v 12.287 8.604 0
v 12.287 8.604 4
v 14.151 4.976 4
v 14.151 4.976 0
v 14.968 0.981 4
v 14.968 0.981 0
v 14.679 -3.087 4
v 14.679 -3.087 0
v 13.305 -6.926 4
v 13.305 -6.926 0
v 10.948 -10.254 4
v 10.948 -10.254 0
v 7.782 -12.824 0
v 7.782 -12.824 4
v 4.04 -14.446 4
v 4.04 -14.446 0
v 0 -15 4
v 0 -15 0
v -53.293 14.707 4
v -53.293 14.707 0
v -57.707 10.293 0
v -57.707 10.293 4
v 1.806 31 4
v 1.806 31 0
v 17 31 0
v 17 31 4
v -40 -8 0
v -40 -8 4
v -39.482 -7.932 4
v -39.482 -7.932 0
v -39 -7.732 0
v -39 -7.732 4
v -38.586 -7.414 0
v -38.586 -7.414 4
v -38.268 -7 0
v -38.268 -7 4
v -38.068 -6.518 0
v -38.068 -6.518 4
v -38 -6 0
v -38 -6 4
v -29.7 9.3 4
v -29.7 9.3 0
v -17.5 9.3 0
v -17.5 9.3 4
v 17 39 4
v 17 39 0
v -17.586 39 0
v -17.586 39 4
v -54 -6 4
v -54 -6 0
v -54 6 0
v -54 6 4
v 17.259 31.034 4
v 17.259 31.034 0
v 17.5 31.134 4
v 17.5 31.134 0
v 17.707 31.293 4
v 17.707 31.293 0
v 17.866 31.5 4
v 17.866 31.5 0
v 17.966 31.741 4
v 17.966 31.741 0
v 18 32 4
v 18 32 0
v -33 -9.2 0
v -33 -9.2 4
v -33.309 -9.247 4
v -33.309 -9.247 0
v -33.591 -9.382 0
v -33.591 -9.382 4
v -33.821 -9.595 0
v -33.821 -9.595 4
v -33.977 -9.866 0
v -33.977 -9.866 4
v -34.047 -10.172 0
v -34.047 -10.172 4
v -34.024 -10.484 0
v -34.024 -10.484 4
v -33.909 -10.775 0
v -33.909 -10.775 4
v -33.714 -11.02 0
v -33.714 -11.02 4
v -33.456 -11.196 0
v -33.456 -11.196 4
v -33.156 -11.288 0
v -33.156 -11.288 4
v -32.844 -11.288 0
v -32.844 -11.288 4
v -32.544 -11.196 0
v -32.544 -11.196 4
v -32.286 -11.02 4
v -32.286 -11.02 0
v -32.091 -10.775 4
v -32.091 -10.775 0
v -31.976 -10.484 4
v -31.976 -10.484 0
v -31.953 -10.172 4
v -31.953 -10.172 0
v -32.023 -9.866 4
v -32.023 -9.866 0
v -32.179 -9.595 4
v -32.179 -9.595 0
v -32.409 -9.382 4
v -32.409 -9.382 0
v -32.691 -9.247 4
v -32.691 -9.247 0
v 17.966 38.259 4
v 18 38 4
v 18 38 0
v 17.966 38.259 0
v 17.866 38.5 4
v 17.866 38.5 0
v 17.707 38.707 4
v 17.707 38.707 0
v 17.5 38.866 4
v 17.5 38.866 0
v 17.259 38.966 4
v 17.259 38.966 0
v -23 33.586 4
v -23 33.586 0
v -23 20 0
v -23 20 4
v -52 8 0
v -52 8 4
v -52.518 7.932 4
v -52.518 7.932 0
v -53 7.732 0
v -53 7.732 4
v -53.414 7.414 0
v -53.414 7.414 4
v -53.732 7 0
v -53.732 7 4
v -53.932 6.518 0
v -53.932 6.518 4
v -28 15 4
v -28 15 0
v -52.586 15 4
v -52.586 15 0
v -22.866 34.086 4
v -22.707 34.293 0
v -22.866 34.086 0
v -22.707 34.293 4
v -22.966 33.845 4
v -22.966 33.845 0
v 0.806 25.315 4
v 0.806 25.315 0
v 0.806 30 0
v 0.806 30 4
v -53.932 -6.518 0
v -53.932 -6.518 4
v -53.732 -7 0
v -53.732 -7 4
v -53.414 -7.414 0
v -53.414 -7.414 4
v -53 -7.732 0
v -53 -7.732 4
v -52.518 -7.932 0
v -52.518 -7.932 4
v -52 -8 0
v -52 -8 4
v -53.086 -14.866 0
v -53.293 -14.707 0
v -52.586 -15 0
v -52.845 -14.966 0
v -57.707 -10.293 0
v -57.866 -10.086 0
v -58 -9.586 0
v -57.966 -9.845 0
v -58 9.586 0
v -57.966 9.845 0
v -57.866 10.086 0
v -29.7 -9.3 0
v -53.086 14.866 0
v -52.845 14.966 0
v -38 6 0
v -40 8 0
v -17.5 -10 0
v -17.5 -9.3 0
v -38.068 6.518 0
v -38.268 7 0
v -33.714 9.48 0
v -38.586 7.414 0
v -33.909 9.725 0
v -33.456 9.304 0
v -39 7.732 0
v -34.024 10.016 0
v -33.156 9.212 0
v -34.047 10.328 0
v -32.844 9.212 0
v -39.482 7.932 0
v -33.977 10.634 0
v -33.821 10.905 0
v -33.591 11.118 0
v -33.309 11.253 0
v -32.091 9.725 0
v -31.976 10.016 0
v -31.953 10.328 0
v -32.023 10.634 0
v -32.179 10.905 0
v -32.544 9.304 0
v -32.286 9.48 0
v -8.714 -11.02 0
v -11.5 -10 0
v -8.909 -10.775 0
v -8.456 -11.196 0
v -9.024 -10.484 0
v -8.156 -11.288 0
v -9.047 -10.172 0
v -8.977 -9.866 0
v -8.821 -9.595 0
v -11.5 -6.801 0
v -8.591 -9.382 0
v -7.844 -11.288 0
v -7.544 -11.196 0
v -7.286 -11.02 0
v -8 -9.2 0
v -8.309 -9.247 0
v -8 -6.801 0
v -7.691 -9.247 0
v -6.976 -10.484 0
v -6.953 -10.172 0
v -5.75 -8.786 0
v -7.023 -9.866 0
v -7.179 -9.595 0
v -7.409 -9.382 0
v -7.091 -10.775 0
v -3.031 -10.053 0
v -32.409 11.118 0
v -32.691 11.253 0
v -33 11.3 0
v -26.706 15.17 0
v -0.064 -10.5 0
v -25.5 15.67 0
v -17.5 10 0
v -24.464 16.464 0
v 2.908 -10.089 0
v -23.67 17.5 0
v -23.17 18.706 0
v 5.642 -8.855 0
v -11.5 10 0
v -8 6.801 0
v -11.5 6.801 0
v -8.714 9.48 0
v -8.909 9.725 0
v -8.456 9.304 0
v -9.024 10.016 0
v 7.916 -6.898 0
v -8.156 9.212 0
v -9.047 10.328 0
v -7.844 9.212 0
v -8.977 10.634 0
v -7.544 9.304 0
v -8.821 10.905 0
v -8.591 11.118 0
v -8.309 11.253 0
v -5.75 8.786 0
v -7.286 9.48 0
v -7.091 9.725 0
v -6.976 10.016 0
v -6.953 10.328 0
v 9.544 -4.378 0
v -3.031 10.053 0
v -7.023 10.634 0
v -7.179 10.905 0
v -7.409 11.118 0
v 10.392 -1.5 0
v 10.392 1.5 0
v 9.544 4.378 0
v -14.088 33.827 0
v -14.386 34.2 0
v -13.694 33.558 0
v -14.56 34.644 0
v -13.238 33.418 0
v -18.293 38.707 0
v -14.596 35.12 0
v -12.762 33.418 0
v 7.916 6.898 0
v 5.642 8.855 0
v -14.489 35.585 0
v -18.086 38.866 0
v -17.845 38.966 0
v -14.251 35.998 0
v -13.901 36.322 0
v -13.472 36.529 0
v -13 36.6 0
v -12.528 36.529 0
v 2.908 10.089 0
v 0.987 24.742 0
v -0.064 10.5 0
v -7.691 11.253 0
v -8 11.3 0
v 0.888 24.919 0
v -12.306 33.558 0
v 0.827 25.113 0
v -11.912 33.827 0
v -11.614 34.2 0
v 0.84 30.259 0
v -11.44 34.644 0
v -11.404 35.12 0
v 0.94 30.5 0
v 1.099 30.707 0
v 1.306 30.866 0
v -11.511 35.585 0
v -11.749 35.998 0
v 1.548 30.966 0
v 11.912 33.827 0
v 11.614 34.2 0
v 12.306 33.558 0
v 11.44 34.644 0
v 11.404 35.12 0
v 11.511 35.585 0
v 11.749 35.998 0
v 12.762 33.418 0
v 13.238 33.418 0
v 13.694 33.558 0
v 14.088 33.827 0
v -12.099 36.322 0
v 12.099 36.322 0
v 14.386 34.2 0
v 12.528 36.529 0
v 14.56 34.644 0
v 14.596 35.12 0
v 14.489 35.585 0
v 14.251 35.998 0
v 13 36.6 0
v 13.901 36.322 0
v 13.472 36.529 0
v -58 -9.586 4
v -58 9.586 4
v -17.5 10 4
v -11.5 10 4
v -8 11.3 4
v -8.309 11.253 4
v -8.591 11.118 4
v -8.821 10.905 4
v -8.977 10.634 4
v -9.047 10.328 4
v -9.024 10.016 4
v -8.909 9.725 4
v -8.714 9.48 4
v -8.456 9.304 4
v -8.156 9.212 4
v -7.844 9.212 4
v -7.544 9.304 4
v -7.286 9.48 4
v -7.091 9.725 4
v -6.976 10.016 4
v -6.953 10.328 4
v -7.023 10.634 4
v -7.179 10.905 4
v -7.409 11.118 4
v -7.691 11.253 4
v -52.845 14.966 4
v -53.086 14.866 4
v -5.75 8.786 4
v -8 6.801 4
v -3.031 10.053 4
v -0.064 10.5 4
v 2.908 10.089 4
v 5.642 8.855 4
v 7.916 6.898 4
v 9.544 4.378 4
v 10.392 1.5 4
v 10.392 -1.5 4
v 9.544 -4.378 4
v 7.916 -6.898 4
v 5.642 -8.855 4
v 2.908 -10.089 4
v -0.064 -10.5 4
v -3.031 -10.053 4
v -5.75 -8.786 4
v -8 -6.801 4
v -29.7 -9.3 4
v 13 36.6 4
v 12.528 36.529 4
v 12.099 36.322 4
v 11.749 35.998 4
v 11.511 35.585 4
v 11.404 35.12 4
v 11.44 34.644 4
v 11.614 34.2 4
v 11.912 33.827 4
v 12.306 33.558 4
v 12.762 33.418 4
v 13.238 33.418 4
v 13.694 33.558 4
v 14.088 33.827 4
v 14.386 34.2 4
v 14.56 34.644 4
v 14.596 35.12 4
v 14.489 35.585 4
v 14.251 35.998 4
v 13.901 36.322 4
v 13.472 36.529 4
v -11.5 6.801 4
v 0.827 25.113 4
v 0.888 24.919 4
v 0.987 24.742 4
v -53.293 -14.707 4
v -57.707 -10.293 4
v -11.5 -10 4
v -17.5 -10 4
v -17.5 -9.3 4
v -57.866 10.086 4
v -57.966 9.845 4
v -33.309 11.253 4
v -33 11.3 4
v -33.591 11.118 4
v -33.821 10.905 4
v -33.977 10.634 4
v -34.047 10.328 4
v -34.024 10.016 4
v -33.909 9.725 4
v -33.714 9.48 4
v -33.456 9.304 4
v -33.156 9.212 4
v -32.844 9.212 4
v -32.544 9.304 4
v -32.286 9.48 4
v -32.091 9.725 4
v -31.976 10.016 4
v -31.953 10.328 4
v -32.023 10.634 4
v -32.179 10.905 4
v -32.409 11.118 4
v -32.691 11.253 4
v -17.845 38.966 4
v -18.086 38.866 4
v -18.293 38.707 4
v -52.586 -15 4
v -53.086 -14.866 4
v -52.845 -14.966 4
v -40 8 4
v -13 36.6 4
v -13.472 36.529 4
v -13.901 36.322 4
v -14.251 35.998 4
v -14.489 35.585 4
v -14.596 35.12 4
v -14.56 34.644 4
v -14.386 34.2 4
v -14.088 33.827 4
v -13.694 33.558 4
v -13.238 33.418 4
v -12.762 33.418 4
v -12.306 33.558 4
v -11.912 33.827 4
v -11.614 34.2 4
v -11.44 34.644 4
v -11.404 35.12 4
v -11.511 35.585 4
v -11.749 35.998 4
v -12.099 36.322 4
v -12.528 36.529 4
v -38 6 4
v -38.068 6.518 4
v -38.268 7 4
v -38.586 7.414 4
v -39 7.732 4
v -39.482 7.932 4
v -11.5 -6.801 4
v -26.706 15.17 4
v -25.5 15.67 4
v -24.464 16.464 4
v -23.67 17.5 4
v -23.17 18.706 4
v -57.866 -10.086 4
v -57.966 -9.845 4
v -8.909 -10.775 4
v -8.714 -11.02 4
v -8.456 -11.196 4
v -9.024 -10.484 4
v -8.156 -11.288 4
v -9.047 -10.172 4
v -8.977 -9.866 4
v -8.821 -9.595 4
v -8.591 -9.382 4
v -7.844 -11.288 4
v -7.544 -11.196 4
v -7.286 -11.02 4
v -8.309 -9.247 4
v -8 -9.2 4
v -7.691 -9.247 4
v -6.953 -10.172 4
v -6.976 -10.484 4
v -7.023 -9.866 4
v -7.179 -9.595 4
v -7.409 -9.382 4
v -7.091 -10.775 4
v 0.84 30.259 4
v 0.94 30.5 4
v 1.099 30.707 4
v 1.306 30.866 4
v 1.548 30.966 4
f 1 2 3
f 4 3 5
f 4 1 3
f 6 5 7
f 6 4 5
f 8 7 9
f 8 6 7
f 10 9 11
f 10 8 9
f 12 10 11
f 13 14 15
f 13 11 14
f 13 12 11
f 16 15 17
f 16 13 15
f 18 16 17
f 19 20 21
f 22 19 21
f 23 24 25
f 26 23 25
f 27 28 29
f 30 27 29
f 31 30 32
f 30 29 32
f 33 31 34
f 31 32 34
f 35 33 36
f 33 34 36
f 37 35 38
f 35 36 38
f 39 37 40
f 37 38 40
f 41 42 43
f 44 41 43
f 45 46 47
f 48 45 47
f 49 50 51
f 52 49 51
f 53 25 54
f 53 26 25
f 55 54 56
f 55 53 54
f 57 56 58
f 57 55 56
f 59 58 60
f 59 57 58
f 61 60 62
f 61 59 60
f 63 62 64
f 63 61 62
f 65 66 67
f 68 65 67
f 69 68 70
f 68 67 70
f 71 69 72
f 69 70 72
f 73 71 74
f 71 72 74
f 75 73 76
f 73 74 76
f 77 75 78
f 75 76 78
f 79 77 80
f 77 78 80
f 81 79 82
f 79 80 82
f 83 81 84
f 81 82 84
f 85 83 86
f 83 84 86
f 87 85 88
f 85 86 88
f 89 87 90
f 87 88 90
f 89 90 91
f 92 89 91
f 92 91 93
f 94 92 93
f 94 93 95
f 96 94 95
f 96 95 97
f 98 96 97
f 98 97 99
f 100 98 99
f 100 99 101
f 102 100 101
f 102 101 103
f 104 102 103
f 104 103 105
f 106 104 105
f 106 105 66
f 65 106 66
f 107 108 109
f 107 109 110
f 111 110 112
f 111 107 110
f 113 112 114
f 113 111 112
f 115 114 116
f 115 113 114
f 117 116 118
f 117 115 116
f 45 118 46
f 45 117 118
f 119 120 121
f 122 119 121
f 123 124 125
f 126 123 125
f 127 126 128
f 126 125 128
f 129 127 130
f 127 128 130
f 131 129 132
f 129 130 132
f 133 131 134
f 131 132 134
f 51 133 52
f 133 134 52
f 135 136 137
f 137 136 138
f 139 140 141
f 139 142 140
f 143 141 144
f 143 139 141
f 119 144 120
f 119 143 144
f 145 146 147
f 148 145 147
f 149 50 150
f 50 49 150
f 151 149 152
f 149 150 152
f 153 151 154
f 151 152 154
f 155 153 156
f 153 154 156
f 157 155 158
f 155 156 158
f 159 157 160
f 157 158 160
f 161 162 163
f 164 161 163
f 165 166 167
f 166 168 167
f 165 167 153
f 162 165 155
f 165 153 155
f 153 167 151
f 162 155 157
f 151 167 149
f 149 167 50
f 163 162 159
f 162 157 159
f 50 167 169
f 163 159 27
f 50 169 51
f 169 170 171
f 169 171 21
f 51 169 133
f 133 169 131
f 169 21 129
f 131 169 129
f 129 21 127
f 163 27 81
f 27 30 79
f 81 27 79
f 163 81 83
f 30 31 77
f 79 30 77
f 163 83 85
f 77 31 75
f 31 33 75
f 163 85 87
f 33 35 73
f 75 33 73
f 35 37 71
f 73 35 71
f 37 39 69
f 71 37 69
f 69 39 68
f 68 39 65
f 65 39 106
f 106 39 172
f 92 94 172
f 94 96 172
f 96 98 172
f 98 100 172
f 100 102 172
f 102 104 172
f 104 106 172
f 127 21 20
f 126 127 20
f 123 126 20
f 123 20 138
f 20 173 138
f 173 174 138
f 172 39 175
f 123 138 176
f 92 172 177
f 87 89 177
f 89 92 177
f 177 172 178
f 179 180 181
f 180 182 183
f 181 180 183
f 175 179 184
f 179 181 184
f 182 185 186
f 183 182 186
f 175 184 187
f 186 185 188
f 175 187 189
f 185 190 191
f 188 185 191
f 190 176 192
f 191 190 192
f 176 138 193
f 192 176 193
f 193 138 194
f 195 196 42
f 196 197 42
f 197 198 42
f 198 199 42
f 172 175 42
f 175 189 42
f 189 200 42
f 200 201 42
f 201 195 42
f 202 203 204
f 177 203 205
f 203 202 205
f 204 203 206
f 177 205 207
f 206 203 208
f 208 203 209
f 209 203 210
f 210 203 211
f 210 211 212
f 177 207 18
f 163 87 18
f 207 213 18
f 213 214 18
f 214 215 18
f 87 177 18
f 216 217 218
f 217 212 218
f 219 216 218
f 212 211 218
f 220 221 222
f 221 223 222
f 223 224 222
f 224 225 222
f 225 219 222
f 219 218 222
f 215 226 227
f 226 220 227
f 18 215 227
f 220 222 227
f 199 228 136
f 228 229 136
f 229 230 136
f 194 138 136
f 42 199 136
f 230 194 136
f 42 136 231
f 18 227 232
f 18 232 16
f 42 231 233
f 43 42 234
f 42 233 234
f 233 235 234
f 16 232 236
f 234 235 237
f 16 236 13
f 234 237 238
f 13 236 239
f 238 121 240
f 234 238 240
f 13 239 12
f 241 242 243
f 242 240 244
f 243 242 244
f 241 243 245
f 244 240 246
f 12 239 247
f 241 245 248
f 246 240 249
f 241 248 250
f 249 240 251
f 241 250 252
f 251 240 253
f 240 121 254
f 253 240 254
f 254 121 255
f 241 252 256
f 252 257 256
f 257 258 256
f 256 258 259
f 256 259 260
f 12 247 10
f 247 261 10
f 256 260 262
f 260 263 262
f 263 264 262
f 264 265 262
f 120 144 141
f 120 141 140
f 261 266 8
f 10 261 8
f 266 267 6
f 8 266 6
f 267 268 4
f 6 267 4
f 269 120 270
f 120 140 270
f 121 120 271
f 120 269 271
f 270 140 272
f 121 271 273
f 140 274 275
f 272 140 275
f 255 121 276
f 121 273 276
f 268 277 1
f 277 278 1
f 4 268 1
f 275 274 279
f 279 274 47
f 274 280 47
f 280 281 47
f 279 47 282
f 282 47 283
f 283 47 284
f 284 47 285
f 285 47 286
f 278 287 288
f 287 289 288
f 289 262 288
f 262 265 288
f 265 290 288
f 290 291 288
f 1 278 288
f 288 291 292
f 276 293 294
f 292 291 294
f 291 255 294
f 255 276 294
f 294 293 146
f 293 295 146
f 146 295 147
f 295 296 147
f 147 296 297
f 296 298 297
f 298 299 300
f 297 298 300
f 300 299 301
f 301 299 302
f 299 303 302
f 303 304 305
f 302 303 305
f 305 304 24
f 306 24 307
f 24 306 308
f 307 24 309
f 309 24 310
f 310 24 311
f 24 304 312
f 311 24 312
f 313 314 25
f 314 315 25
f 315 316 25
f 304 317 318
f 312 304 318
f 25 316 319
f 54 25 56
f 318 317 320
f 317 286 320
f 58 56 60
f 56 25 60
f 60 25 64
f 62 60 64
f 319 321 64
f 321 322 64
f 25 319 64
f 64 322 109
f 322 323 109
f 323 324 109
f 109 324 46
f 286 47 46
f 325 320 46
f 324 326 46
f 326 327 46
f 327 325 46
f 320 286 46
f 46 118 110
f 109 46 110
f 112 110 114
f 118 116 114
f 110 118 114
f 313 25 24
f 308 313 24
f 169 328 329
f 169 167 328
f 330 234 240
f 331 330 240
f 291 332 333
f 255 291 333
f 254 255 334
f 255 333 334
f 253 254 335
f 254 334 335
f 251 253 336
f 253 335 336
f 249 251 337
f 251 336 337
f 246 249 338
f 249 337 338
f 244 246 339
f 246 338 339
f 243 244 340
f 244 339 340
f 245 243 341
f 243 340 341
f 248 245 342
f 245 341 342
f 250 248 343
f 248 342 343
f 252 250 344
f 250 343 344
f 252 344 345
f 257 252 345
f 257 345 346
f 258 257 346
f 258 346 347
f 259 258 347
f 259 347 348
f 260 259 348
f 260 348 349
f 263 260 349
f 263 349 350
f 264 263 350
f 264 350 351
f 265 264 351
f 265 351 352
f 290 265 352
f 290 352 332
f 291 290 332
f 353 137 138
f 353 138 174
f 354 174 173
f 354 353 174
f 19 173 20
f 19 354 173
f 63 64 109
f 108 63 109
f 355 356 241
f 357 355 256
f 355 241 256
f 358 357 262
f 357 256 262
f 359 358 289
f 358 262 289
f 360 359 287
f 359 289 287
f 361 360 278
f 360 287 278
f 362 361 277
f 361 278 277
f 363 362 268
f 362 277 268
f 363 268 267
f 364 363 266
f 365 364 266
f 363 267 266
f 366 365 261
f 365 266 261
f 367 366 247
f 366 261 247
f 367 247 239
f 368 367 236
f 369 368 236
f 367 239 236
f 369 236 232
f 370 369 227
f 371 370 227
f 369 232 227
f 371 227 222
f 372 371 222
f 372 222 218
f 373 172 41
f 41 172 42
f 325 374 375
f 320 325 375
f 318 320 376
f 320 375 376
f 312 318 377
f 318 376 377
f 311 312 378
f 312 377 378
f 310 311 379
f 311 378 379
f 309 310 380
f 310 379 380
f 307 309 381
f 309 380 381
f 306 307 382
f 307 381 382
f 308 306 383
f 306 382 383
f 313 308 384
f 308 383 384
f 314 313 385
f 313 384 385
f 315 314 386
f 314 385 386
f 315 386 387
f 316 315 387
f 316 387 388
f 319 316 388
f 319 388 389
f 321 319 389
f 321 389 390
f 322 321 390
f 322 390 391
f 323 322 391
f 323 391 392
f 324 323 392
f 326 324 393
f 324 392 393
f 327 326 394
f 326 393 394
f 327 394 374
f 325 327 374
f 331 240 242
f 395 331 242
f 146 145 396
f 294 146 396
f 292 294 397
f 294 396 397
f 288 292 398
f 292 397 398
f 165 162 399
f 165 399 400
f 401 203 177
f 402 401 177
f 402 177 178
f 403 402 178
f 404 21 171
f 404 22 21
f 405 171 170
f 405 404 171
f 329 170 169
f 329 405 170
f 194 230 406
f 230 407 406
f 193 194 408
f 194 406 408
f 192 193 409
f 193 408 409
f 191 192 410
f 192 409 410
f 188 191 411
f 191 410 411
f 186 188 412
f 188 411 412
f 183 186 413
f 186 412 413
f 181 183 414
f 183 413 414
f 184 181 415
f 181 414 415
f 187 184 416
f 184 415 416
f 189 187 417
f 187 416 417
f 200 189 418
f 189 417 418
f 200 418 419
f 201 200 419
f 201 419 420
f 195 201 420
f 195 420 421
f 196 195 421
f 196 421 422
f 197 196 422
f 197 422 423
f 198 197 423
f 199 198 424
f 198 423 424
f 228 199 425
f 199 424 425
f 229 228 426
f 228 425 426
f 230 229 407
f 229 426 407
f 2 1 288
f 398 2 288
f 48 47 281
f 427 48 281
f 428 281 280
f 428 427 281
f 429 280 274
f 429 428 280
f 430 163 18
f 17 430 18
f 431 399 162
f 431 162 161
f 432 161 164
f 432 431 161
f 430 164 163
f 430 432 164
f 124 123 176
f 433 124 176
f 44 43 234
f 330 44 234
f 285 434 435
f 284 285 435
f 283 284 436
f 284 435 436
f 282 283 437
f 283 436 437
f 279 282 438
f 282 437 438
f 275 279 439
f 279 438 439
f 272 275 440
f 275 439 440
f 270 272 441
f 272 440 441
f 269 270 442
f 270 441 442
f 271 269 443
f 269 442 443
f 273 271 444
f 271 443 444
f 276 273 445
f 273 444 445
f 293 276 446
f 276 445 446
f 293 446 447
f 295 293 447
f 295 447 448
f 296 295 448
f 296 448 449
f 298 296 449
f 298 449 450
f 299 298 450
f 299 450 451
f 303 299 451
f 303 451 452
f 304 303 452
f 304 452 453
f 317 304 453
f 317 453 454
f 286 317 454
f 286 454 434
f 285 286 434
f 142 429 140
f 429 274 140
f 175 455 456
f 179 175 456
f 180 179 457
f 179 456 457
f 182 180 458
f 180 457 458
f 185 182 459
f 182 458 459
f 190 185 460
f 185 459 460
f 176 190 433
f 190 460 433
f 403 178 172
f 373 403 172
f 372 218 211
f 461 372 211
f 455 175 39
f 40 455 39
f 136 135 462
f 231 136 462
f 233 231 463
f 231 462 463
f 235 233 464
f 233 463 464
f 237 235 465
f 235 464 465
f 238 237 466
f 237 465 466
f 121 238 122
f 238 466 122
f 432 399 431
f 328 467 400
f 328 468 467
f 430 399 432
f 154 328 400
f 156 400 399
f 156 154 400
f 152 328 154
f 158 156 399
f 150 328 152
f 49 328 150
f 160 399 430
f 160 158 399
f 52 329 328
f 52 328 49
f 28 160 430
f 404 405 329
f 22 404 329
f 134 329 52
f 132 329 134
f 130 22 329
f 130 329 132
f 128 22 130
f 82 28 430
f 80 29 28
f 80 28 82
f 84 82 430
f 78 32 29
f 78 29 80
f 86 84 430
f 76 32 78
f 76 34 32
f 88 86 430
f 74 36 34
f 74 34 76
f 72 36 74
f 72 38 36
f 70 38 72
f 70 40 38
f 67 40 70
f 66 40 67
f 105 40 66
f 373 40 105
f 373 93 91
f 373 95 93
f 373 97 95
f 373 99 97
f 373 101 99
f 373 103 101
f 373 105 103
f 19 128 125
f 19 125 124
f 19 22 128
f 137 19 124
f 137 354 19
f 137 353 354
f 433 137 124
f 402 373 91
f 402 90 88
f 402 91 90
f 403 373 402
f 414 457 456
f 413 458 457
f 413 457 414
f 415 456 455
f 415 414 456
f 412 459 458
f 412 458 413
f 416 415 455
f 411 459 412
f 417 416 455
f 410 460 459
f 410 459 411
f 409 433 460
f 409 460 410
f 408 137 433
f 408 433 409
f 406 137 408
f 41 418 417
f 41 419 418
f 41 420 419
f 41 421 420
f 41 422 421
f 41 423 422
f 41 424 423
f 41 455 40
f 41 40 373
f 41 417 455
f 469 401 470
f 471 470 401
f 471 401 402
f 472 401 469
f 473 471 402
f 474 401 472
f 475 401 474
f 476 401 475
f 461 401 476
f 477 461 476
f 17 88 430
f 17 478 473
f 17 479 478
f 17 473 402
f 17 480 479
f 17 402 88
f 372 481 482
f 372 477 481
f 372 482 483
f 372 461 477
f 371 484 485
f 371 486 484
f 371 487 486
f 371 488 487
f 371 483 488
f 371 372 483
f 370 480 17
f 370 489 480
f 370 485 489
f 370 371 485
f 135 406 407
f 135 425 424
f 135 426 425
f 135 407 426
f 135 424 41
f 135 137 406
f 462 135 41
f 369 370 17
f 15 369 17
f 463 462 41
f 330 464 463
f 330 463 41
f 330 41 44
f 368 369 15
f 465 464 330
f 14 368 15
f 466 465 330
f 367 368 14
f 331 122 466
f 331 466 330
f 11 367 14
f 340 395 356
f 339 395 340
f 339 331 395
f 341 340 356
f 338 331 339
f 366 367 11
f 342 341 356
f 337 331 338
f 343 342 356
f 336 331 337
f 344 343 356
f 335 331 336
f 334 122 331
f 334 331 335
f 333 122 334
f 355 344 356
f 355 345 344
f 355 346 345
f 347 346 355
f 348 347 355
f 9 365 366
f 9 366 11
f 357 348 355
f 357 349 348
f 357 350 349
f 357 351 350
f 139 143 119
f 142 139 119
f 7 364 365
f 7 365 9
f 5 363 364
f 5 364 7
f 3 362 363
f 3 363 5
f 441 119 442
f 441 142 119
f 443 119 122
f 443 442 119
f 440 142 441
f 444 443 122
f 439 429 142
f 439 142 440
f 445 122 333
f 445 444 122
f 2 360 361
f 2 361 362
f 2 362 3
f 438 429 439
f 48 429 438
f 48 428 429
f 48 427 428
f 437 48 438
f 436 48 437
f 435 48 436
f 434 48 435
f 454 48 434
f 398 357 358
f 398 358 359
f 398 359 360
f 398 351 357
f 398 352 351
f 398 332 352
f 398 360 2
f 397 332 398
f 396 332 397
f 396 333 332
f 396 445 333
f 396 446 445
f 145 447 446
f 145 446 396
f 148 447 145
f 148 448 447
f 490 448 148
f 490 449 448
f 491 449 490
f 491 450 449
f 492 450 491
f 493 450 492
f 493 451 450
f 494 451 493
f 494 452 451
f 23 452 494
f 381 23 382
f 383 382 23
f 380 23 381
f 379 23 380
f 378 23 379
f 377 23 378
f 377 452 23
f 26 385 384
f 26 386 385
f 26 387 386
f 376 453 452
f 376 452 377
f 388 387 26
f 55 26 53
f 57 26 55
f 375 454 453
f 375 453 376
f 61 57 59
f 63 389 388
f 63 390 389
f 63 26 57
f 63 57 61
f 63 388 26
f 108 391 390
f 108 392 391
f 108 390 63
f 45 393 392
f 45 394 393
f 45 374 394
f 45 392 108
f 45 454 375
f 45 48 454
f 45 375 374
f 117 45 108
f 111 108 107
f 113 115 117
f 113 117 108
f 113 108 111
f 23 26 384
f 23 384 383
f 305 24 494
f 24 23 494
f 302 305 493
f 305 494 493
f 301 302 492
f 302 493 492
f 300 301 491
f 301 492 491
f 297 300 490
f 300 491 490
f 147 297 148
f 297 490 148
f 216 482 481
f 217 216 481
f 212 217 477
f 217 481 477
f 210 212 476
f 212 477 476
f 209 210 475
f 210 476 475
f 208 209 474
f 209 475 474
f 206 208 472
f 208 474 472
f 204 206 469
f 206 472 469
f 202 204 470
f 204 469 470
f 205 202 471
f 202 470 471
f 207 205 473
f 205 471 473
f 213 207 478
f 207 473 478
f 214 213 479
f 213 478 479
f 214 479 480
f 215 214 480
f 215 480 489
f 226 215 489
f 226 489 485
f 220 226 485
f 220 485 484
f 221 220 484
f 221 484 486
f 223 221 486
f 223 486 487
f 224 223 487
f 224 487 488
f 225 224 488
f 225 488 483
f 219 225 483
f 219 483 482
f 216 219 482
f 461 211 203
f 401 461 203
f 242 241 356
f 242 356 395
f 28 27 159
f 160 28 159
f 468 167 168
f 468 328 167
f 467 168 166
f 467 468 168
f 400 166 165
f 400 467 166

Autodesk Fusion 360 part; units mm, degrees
sketch "スケッチ1" plane through (0, 0, 0) normal (0, 0, 1) x (1, 0, 0)
  line L0 (-53, -15) -> (0, -15)
  circle A0 centre (0, 0) radius 15
  line L1 (12.2873, 8.6036) -> (0.8064, 25)
  circle A1 centre (0, 0) radius 10.5
  line L2 (-33, 10.25) -> (-8, 10.25)
  line L3 (-8, 10.25) -> (-8, -10.25)
  line L4 (-8, -10.25) -> (-33, -10.25)
  line L5 (-33, -10.25) -> (-33, 10.25)
  line L6 (-13, 35) -> (13, 35)
  line L7 (-53, -15) -> (-58, -10)
  line L8 (-58, -10) -> (-58, 10)
  line L9 (-54, 8) -> (-38, 8)
  line L10 (-38, 8) -> (-38, -8)
  line L11 (-38, -8) -> (-54, -8)
  line L12 (-54, -8) -> (-54, 8)
  line L13 (-23, 15) -> (-53, 15)
  line L14 (-53, 15) -> (-58, 10)
  line L15 (-11.5, 10) -> (-11.5, -10)
  line L16 (-11.5, -10) -> (-17.5, -10)
  line L17 (-17.5, -10) -> (-17.5, -9.3)
  line L18 (-17.5, -9.3) -> (-29.7, -9.3)
  line L19 (-29.7, -9.3) -> (-29.7, 9.3)
  line L20 (-29.7, 9.3) -> (-17.5, 9.3)
  line L21 (-17.5, 9.3) -> (-17.5, 10)
  line L22 (-17.5, 10) -> (-11.5, 10)
  line L23 (-8, 6.8007) -> (-11.5, 6.8007)
  line L24 (-8, -6.8007) -> (-11.5, -6.8007)
  line L25 (0.8064, 25) -> (0.8064, 31)
  line L26 (0.8064, 31) -> (18, 31)
  line L27 (18, 31) -> (18, 39)
  line L28 (18, 39) -> (-18, 39)
  line L29 (-18, 39) -> (-23, 34)
  line L30 (-23, 34) -> (-23, 15)
  point P0 (-8, 0)
  point P1 (-11.5, 0)
  point P2 (-29.7, 0)
  point P3 (18, 35)
  dimension "d1" = 30
  dimension "d2" = 55
  dimension "d3" = 53
  dimension "d6" = 21
  dimension "d7" = 8
  dimension "d8" = 25
  dimension "d9" = 20.5
  dimension "d28" = 26
  dimension "d35" = 5
  dimension "d36" = 5
  dimension "d42" = 16
  dimension "d43" = 4
  dimension "d45" = 2
  dimension "d55" = 2
  dimension "d57" = 12.2
  dimension "d58" = 18.6
  dimension "d59" = 20
  dimension "d60" = 11.5
  dimension "d61" = 6
  dimension "d64" = 25
  dimension "d65" = 6
  dimension "d66" = 8
  dimension "d67" = 18
  dimension "d68" = 5
  dimension "d69" = 16
  dimension "d71" = 5
  dimension "d72" = 5
  dimension "d74" = 5
  dimension "d75" = 5
  dimension "d76" = 5
extrude "押し出し1" add sketch "スケッチ1" along normal blind 4 contours L0 A0 L1 L2 L4 L5 L7 L8 L13 L14 L25 L26 L27 L28 L29 L30 | A0 A1 L2 L3 L4 | A0 L2 L4 L5 L15 L16 L17 L18 L19 L20 L21 L22 | A0 L3 L4 L15 L24 | A0 L2 L3 L15 L23
hole "穴1" at (-8, 10.25, 0) at (-8, -10.25, 0) at (-33, -10.25, 0) at (-33, 10.25, 0) direction (0, 0, 1) diameter 2.1 depth 10 tip angle 118
hole "穴3" at (-13, 35, 0) at (13, 35, 0) direction (0, 0, 1) diameter 3.2 depth 10 tip angle 118
fillet "フィレット3" radius 2 4 edges at (-54, 8, 2) (-54, -8, 2) (-38, -8, 2) (-38, 8, 2)
fillet "フィレット4" radius 1 10 edges at (-53, -15, 2) (-58, -10, 2) (-58, 10, 2) (-53, 15, 2) (-23, 34, 2) (-18, 39, 2) (18, 39, 2) (18, 31, 2) (0.8064, 25, 2) (0.8064, 31, 2)
fillet "フィレット5" radius 5 1 edges at (-23, 15, 2)
